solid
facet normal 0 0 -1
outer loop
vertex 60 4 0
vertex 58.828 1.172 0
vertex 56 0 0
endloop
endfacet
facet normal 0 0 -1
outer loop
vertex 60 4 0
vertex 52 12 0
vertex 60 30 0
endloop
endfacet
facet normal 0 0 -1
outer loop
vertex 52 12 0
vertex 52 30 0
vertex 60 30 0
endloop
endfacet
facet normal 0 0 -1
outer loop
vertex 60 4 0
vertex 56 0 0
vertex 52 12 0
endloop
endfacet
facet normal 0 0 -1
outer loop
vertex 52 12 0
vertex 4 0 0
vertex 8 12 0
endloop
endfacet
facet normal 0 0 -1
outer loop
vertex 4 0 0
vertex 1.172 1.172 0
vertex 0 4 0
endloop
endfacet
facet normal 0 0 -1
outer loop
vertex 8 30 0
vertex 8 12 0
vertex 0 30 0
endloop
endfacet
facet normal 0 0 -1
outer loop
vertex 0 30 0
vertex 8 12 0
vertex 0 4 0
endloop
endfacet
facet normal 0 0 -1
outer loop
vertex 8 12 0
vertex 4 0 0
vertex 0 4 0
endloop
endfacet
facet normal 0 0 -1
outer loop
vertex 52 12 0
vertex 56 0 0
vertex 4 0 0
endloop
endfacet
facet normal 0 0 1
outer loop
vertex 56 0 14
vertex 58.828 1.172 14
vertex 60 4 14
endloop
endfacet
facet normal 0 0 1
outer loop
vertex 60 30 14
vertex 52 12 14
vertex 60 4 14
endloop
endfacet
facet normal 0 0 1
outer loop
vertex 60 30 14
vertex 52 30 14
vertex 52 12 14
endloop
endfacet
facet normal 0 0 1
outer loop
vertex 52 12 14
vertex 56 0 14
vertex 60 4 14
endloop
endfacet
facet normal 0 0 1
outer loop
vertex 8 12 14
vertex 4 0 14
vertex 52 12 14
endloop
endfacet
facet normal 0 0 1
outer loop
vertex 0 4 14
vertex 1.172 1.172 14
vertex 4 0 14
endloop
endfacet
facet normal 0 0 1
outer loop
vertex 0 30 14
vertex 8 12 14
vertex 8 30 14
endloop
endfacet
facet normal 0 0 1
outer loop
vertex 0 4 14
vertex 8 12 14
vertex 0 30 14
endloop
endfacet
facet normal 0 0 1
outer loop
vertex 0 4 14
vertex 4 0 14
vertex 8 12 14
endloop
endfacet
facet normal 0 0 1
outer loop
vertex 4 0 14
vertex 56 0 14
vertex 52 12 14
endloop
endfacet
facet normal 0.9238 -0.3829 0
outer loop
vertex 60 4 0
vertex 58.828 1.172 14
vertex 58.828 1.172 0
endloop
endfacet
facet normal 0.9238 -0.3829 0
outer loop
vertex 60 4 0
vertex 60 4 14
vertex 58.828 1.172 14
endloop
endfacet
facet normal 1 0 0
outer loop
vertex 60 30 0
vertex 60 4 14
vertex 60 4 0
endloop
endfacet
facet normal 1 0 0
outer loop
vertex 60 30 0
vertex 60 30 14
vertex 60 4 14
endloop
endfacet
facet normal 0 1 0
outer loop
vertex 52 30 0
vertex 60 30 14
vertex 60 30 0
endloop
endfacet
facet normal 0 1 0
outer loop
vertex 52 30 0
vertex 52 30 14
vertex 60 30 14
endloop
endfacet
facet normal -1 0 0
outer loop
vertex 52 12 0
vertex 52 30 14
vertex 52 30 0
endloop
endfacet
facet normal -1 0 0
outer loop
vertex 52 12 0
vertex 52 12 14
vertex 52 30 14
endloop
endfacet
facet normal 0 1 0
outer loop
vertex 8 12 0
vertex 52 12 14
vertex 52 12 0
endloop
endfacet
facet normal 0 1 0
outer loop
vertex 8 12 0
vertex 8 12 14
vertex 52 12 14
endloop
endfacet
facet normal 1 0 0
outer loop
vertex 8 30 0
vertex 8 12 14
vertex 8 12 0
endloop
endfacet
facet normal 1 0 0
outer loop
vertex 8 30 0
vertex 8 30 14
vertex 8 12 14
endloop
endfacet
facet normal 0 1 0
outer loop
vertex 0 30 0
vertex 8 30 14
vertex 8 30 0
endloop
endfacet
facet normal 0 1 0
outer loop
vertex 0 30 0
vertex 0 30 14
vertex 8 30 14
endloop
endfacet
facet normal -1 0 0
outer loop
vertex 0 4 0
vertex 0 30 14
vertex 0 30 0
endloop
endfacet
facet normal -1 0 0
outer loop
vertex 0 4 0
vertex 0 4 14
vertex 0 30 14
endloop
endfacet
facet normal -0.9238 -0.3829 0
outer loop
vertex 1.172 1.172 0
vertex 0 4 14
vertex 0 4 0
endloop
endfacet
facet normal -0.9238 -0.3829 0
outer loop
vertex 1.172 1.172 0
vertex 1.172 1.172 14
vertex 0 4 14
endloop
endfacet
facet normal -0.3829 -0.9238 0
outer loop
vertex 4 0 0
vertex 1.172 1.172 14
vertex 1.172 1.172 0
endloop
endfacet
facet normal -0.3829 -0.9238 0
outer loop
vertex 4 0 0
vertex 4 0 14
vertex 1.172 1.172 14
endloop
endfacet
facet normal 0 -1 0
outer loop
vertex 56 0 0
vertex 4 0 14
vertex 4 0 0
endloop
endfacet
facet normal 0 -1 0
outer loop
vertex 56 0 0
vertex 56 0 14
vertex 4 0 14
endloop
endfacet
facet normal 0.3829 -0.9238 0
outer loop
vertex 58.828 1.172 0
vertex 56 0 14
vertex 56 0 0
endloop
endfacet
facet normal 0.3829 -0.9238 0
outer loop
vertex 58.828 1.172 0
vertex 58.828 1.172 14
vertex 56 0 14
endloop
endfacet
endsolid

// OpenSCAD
$fn = 32;

// ----------------------------------------------------------------------
// Heat sink frame: 60 x 30 mm frame, 8 mm walls
// ----------------------------------------------------------------------

// --- parameters (mm) ---
profile_height = 14;      // extrusion height
profile_points = 12;      // points of the closed outline

profile = [[0, 4], [1.172, 1.172], [4, 0], [56, 0], [58.828, 1.172], [60, 4], [60, 30], [52, 30], [52, 12], [8, 12], [8, 30], [0, 30]];  // single closed polygon, 12 points, counter clockwise

// --- the one profile operation ---
linear_extrude(height = profile_height) polygon(points = profile);
